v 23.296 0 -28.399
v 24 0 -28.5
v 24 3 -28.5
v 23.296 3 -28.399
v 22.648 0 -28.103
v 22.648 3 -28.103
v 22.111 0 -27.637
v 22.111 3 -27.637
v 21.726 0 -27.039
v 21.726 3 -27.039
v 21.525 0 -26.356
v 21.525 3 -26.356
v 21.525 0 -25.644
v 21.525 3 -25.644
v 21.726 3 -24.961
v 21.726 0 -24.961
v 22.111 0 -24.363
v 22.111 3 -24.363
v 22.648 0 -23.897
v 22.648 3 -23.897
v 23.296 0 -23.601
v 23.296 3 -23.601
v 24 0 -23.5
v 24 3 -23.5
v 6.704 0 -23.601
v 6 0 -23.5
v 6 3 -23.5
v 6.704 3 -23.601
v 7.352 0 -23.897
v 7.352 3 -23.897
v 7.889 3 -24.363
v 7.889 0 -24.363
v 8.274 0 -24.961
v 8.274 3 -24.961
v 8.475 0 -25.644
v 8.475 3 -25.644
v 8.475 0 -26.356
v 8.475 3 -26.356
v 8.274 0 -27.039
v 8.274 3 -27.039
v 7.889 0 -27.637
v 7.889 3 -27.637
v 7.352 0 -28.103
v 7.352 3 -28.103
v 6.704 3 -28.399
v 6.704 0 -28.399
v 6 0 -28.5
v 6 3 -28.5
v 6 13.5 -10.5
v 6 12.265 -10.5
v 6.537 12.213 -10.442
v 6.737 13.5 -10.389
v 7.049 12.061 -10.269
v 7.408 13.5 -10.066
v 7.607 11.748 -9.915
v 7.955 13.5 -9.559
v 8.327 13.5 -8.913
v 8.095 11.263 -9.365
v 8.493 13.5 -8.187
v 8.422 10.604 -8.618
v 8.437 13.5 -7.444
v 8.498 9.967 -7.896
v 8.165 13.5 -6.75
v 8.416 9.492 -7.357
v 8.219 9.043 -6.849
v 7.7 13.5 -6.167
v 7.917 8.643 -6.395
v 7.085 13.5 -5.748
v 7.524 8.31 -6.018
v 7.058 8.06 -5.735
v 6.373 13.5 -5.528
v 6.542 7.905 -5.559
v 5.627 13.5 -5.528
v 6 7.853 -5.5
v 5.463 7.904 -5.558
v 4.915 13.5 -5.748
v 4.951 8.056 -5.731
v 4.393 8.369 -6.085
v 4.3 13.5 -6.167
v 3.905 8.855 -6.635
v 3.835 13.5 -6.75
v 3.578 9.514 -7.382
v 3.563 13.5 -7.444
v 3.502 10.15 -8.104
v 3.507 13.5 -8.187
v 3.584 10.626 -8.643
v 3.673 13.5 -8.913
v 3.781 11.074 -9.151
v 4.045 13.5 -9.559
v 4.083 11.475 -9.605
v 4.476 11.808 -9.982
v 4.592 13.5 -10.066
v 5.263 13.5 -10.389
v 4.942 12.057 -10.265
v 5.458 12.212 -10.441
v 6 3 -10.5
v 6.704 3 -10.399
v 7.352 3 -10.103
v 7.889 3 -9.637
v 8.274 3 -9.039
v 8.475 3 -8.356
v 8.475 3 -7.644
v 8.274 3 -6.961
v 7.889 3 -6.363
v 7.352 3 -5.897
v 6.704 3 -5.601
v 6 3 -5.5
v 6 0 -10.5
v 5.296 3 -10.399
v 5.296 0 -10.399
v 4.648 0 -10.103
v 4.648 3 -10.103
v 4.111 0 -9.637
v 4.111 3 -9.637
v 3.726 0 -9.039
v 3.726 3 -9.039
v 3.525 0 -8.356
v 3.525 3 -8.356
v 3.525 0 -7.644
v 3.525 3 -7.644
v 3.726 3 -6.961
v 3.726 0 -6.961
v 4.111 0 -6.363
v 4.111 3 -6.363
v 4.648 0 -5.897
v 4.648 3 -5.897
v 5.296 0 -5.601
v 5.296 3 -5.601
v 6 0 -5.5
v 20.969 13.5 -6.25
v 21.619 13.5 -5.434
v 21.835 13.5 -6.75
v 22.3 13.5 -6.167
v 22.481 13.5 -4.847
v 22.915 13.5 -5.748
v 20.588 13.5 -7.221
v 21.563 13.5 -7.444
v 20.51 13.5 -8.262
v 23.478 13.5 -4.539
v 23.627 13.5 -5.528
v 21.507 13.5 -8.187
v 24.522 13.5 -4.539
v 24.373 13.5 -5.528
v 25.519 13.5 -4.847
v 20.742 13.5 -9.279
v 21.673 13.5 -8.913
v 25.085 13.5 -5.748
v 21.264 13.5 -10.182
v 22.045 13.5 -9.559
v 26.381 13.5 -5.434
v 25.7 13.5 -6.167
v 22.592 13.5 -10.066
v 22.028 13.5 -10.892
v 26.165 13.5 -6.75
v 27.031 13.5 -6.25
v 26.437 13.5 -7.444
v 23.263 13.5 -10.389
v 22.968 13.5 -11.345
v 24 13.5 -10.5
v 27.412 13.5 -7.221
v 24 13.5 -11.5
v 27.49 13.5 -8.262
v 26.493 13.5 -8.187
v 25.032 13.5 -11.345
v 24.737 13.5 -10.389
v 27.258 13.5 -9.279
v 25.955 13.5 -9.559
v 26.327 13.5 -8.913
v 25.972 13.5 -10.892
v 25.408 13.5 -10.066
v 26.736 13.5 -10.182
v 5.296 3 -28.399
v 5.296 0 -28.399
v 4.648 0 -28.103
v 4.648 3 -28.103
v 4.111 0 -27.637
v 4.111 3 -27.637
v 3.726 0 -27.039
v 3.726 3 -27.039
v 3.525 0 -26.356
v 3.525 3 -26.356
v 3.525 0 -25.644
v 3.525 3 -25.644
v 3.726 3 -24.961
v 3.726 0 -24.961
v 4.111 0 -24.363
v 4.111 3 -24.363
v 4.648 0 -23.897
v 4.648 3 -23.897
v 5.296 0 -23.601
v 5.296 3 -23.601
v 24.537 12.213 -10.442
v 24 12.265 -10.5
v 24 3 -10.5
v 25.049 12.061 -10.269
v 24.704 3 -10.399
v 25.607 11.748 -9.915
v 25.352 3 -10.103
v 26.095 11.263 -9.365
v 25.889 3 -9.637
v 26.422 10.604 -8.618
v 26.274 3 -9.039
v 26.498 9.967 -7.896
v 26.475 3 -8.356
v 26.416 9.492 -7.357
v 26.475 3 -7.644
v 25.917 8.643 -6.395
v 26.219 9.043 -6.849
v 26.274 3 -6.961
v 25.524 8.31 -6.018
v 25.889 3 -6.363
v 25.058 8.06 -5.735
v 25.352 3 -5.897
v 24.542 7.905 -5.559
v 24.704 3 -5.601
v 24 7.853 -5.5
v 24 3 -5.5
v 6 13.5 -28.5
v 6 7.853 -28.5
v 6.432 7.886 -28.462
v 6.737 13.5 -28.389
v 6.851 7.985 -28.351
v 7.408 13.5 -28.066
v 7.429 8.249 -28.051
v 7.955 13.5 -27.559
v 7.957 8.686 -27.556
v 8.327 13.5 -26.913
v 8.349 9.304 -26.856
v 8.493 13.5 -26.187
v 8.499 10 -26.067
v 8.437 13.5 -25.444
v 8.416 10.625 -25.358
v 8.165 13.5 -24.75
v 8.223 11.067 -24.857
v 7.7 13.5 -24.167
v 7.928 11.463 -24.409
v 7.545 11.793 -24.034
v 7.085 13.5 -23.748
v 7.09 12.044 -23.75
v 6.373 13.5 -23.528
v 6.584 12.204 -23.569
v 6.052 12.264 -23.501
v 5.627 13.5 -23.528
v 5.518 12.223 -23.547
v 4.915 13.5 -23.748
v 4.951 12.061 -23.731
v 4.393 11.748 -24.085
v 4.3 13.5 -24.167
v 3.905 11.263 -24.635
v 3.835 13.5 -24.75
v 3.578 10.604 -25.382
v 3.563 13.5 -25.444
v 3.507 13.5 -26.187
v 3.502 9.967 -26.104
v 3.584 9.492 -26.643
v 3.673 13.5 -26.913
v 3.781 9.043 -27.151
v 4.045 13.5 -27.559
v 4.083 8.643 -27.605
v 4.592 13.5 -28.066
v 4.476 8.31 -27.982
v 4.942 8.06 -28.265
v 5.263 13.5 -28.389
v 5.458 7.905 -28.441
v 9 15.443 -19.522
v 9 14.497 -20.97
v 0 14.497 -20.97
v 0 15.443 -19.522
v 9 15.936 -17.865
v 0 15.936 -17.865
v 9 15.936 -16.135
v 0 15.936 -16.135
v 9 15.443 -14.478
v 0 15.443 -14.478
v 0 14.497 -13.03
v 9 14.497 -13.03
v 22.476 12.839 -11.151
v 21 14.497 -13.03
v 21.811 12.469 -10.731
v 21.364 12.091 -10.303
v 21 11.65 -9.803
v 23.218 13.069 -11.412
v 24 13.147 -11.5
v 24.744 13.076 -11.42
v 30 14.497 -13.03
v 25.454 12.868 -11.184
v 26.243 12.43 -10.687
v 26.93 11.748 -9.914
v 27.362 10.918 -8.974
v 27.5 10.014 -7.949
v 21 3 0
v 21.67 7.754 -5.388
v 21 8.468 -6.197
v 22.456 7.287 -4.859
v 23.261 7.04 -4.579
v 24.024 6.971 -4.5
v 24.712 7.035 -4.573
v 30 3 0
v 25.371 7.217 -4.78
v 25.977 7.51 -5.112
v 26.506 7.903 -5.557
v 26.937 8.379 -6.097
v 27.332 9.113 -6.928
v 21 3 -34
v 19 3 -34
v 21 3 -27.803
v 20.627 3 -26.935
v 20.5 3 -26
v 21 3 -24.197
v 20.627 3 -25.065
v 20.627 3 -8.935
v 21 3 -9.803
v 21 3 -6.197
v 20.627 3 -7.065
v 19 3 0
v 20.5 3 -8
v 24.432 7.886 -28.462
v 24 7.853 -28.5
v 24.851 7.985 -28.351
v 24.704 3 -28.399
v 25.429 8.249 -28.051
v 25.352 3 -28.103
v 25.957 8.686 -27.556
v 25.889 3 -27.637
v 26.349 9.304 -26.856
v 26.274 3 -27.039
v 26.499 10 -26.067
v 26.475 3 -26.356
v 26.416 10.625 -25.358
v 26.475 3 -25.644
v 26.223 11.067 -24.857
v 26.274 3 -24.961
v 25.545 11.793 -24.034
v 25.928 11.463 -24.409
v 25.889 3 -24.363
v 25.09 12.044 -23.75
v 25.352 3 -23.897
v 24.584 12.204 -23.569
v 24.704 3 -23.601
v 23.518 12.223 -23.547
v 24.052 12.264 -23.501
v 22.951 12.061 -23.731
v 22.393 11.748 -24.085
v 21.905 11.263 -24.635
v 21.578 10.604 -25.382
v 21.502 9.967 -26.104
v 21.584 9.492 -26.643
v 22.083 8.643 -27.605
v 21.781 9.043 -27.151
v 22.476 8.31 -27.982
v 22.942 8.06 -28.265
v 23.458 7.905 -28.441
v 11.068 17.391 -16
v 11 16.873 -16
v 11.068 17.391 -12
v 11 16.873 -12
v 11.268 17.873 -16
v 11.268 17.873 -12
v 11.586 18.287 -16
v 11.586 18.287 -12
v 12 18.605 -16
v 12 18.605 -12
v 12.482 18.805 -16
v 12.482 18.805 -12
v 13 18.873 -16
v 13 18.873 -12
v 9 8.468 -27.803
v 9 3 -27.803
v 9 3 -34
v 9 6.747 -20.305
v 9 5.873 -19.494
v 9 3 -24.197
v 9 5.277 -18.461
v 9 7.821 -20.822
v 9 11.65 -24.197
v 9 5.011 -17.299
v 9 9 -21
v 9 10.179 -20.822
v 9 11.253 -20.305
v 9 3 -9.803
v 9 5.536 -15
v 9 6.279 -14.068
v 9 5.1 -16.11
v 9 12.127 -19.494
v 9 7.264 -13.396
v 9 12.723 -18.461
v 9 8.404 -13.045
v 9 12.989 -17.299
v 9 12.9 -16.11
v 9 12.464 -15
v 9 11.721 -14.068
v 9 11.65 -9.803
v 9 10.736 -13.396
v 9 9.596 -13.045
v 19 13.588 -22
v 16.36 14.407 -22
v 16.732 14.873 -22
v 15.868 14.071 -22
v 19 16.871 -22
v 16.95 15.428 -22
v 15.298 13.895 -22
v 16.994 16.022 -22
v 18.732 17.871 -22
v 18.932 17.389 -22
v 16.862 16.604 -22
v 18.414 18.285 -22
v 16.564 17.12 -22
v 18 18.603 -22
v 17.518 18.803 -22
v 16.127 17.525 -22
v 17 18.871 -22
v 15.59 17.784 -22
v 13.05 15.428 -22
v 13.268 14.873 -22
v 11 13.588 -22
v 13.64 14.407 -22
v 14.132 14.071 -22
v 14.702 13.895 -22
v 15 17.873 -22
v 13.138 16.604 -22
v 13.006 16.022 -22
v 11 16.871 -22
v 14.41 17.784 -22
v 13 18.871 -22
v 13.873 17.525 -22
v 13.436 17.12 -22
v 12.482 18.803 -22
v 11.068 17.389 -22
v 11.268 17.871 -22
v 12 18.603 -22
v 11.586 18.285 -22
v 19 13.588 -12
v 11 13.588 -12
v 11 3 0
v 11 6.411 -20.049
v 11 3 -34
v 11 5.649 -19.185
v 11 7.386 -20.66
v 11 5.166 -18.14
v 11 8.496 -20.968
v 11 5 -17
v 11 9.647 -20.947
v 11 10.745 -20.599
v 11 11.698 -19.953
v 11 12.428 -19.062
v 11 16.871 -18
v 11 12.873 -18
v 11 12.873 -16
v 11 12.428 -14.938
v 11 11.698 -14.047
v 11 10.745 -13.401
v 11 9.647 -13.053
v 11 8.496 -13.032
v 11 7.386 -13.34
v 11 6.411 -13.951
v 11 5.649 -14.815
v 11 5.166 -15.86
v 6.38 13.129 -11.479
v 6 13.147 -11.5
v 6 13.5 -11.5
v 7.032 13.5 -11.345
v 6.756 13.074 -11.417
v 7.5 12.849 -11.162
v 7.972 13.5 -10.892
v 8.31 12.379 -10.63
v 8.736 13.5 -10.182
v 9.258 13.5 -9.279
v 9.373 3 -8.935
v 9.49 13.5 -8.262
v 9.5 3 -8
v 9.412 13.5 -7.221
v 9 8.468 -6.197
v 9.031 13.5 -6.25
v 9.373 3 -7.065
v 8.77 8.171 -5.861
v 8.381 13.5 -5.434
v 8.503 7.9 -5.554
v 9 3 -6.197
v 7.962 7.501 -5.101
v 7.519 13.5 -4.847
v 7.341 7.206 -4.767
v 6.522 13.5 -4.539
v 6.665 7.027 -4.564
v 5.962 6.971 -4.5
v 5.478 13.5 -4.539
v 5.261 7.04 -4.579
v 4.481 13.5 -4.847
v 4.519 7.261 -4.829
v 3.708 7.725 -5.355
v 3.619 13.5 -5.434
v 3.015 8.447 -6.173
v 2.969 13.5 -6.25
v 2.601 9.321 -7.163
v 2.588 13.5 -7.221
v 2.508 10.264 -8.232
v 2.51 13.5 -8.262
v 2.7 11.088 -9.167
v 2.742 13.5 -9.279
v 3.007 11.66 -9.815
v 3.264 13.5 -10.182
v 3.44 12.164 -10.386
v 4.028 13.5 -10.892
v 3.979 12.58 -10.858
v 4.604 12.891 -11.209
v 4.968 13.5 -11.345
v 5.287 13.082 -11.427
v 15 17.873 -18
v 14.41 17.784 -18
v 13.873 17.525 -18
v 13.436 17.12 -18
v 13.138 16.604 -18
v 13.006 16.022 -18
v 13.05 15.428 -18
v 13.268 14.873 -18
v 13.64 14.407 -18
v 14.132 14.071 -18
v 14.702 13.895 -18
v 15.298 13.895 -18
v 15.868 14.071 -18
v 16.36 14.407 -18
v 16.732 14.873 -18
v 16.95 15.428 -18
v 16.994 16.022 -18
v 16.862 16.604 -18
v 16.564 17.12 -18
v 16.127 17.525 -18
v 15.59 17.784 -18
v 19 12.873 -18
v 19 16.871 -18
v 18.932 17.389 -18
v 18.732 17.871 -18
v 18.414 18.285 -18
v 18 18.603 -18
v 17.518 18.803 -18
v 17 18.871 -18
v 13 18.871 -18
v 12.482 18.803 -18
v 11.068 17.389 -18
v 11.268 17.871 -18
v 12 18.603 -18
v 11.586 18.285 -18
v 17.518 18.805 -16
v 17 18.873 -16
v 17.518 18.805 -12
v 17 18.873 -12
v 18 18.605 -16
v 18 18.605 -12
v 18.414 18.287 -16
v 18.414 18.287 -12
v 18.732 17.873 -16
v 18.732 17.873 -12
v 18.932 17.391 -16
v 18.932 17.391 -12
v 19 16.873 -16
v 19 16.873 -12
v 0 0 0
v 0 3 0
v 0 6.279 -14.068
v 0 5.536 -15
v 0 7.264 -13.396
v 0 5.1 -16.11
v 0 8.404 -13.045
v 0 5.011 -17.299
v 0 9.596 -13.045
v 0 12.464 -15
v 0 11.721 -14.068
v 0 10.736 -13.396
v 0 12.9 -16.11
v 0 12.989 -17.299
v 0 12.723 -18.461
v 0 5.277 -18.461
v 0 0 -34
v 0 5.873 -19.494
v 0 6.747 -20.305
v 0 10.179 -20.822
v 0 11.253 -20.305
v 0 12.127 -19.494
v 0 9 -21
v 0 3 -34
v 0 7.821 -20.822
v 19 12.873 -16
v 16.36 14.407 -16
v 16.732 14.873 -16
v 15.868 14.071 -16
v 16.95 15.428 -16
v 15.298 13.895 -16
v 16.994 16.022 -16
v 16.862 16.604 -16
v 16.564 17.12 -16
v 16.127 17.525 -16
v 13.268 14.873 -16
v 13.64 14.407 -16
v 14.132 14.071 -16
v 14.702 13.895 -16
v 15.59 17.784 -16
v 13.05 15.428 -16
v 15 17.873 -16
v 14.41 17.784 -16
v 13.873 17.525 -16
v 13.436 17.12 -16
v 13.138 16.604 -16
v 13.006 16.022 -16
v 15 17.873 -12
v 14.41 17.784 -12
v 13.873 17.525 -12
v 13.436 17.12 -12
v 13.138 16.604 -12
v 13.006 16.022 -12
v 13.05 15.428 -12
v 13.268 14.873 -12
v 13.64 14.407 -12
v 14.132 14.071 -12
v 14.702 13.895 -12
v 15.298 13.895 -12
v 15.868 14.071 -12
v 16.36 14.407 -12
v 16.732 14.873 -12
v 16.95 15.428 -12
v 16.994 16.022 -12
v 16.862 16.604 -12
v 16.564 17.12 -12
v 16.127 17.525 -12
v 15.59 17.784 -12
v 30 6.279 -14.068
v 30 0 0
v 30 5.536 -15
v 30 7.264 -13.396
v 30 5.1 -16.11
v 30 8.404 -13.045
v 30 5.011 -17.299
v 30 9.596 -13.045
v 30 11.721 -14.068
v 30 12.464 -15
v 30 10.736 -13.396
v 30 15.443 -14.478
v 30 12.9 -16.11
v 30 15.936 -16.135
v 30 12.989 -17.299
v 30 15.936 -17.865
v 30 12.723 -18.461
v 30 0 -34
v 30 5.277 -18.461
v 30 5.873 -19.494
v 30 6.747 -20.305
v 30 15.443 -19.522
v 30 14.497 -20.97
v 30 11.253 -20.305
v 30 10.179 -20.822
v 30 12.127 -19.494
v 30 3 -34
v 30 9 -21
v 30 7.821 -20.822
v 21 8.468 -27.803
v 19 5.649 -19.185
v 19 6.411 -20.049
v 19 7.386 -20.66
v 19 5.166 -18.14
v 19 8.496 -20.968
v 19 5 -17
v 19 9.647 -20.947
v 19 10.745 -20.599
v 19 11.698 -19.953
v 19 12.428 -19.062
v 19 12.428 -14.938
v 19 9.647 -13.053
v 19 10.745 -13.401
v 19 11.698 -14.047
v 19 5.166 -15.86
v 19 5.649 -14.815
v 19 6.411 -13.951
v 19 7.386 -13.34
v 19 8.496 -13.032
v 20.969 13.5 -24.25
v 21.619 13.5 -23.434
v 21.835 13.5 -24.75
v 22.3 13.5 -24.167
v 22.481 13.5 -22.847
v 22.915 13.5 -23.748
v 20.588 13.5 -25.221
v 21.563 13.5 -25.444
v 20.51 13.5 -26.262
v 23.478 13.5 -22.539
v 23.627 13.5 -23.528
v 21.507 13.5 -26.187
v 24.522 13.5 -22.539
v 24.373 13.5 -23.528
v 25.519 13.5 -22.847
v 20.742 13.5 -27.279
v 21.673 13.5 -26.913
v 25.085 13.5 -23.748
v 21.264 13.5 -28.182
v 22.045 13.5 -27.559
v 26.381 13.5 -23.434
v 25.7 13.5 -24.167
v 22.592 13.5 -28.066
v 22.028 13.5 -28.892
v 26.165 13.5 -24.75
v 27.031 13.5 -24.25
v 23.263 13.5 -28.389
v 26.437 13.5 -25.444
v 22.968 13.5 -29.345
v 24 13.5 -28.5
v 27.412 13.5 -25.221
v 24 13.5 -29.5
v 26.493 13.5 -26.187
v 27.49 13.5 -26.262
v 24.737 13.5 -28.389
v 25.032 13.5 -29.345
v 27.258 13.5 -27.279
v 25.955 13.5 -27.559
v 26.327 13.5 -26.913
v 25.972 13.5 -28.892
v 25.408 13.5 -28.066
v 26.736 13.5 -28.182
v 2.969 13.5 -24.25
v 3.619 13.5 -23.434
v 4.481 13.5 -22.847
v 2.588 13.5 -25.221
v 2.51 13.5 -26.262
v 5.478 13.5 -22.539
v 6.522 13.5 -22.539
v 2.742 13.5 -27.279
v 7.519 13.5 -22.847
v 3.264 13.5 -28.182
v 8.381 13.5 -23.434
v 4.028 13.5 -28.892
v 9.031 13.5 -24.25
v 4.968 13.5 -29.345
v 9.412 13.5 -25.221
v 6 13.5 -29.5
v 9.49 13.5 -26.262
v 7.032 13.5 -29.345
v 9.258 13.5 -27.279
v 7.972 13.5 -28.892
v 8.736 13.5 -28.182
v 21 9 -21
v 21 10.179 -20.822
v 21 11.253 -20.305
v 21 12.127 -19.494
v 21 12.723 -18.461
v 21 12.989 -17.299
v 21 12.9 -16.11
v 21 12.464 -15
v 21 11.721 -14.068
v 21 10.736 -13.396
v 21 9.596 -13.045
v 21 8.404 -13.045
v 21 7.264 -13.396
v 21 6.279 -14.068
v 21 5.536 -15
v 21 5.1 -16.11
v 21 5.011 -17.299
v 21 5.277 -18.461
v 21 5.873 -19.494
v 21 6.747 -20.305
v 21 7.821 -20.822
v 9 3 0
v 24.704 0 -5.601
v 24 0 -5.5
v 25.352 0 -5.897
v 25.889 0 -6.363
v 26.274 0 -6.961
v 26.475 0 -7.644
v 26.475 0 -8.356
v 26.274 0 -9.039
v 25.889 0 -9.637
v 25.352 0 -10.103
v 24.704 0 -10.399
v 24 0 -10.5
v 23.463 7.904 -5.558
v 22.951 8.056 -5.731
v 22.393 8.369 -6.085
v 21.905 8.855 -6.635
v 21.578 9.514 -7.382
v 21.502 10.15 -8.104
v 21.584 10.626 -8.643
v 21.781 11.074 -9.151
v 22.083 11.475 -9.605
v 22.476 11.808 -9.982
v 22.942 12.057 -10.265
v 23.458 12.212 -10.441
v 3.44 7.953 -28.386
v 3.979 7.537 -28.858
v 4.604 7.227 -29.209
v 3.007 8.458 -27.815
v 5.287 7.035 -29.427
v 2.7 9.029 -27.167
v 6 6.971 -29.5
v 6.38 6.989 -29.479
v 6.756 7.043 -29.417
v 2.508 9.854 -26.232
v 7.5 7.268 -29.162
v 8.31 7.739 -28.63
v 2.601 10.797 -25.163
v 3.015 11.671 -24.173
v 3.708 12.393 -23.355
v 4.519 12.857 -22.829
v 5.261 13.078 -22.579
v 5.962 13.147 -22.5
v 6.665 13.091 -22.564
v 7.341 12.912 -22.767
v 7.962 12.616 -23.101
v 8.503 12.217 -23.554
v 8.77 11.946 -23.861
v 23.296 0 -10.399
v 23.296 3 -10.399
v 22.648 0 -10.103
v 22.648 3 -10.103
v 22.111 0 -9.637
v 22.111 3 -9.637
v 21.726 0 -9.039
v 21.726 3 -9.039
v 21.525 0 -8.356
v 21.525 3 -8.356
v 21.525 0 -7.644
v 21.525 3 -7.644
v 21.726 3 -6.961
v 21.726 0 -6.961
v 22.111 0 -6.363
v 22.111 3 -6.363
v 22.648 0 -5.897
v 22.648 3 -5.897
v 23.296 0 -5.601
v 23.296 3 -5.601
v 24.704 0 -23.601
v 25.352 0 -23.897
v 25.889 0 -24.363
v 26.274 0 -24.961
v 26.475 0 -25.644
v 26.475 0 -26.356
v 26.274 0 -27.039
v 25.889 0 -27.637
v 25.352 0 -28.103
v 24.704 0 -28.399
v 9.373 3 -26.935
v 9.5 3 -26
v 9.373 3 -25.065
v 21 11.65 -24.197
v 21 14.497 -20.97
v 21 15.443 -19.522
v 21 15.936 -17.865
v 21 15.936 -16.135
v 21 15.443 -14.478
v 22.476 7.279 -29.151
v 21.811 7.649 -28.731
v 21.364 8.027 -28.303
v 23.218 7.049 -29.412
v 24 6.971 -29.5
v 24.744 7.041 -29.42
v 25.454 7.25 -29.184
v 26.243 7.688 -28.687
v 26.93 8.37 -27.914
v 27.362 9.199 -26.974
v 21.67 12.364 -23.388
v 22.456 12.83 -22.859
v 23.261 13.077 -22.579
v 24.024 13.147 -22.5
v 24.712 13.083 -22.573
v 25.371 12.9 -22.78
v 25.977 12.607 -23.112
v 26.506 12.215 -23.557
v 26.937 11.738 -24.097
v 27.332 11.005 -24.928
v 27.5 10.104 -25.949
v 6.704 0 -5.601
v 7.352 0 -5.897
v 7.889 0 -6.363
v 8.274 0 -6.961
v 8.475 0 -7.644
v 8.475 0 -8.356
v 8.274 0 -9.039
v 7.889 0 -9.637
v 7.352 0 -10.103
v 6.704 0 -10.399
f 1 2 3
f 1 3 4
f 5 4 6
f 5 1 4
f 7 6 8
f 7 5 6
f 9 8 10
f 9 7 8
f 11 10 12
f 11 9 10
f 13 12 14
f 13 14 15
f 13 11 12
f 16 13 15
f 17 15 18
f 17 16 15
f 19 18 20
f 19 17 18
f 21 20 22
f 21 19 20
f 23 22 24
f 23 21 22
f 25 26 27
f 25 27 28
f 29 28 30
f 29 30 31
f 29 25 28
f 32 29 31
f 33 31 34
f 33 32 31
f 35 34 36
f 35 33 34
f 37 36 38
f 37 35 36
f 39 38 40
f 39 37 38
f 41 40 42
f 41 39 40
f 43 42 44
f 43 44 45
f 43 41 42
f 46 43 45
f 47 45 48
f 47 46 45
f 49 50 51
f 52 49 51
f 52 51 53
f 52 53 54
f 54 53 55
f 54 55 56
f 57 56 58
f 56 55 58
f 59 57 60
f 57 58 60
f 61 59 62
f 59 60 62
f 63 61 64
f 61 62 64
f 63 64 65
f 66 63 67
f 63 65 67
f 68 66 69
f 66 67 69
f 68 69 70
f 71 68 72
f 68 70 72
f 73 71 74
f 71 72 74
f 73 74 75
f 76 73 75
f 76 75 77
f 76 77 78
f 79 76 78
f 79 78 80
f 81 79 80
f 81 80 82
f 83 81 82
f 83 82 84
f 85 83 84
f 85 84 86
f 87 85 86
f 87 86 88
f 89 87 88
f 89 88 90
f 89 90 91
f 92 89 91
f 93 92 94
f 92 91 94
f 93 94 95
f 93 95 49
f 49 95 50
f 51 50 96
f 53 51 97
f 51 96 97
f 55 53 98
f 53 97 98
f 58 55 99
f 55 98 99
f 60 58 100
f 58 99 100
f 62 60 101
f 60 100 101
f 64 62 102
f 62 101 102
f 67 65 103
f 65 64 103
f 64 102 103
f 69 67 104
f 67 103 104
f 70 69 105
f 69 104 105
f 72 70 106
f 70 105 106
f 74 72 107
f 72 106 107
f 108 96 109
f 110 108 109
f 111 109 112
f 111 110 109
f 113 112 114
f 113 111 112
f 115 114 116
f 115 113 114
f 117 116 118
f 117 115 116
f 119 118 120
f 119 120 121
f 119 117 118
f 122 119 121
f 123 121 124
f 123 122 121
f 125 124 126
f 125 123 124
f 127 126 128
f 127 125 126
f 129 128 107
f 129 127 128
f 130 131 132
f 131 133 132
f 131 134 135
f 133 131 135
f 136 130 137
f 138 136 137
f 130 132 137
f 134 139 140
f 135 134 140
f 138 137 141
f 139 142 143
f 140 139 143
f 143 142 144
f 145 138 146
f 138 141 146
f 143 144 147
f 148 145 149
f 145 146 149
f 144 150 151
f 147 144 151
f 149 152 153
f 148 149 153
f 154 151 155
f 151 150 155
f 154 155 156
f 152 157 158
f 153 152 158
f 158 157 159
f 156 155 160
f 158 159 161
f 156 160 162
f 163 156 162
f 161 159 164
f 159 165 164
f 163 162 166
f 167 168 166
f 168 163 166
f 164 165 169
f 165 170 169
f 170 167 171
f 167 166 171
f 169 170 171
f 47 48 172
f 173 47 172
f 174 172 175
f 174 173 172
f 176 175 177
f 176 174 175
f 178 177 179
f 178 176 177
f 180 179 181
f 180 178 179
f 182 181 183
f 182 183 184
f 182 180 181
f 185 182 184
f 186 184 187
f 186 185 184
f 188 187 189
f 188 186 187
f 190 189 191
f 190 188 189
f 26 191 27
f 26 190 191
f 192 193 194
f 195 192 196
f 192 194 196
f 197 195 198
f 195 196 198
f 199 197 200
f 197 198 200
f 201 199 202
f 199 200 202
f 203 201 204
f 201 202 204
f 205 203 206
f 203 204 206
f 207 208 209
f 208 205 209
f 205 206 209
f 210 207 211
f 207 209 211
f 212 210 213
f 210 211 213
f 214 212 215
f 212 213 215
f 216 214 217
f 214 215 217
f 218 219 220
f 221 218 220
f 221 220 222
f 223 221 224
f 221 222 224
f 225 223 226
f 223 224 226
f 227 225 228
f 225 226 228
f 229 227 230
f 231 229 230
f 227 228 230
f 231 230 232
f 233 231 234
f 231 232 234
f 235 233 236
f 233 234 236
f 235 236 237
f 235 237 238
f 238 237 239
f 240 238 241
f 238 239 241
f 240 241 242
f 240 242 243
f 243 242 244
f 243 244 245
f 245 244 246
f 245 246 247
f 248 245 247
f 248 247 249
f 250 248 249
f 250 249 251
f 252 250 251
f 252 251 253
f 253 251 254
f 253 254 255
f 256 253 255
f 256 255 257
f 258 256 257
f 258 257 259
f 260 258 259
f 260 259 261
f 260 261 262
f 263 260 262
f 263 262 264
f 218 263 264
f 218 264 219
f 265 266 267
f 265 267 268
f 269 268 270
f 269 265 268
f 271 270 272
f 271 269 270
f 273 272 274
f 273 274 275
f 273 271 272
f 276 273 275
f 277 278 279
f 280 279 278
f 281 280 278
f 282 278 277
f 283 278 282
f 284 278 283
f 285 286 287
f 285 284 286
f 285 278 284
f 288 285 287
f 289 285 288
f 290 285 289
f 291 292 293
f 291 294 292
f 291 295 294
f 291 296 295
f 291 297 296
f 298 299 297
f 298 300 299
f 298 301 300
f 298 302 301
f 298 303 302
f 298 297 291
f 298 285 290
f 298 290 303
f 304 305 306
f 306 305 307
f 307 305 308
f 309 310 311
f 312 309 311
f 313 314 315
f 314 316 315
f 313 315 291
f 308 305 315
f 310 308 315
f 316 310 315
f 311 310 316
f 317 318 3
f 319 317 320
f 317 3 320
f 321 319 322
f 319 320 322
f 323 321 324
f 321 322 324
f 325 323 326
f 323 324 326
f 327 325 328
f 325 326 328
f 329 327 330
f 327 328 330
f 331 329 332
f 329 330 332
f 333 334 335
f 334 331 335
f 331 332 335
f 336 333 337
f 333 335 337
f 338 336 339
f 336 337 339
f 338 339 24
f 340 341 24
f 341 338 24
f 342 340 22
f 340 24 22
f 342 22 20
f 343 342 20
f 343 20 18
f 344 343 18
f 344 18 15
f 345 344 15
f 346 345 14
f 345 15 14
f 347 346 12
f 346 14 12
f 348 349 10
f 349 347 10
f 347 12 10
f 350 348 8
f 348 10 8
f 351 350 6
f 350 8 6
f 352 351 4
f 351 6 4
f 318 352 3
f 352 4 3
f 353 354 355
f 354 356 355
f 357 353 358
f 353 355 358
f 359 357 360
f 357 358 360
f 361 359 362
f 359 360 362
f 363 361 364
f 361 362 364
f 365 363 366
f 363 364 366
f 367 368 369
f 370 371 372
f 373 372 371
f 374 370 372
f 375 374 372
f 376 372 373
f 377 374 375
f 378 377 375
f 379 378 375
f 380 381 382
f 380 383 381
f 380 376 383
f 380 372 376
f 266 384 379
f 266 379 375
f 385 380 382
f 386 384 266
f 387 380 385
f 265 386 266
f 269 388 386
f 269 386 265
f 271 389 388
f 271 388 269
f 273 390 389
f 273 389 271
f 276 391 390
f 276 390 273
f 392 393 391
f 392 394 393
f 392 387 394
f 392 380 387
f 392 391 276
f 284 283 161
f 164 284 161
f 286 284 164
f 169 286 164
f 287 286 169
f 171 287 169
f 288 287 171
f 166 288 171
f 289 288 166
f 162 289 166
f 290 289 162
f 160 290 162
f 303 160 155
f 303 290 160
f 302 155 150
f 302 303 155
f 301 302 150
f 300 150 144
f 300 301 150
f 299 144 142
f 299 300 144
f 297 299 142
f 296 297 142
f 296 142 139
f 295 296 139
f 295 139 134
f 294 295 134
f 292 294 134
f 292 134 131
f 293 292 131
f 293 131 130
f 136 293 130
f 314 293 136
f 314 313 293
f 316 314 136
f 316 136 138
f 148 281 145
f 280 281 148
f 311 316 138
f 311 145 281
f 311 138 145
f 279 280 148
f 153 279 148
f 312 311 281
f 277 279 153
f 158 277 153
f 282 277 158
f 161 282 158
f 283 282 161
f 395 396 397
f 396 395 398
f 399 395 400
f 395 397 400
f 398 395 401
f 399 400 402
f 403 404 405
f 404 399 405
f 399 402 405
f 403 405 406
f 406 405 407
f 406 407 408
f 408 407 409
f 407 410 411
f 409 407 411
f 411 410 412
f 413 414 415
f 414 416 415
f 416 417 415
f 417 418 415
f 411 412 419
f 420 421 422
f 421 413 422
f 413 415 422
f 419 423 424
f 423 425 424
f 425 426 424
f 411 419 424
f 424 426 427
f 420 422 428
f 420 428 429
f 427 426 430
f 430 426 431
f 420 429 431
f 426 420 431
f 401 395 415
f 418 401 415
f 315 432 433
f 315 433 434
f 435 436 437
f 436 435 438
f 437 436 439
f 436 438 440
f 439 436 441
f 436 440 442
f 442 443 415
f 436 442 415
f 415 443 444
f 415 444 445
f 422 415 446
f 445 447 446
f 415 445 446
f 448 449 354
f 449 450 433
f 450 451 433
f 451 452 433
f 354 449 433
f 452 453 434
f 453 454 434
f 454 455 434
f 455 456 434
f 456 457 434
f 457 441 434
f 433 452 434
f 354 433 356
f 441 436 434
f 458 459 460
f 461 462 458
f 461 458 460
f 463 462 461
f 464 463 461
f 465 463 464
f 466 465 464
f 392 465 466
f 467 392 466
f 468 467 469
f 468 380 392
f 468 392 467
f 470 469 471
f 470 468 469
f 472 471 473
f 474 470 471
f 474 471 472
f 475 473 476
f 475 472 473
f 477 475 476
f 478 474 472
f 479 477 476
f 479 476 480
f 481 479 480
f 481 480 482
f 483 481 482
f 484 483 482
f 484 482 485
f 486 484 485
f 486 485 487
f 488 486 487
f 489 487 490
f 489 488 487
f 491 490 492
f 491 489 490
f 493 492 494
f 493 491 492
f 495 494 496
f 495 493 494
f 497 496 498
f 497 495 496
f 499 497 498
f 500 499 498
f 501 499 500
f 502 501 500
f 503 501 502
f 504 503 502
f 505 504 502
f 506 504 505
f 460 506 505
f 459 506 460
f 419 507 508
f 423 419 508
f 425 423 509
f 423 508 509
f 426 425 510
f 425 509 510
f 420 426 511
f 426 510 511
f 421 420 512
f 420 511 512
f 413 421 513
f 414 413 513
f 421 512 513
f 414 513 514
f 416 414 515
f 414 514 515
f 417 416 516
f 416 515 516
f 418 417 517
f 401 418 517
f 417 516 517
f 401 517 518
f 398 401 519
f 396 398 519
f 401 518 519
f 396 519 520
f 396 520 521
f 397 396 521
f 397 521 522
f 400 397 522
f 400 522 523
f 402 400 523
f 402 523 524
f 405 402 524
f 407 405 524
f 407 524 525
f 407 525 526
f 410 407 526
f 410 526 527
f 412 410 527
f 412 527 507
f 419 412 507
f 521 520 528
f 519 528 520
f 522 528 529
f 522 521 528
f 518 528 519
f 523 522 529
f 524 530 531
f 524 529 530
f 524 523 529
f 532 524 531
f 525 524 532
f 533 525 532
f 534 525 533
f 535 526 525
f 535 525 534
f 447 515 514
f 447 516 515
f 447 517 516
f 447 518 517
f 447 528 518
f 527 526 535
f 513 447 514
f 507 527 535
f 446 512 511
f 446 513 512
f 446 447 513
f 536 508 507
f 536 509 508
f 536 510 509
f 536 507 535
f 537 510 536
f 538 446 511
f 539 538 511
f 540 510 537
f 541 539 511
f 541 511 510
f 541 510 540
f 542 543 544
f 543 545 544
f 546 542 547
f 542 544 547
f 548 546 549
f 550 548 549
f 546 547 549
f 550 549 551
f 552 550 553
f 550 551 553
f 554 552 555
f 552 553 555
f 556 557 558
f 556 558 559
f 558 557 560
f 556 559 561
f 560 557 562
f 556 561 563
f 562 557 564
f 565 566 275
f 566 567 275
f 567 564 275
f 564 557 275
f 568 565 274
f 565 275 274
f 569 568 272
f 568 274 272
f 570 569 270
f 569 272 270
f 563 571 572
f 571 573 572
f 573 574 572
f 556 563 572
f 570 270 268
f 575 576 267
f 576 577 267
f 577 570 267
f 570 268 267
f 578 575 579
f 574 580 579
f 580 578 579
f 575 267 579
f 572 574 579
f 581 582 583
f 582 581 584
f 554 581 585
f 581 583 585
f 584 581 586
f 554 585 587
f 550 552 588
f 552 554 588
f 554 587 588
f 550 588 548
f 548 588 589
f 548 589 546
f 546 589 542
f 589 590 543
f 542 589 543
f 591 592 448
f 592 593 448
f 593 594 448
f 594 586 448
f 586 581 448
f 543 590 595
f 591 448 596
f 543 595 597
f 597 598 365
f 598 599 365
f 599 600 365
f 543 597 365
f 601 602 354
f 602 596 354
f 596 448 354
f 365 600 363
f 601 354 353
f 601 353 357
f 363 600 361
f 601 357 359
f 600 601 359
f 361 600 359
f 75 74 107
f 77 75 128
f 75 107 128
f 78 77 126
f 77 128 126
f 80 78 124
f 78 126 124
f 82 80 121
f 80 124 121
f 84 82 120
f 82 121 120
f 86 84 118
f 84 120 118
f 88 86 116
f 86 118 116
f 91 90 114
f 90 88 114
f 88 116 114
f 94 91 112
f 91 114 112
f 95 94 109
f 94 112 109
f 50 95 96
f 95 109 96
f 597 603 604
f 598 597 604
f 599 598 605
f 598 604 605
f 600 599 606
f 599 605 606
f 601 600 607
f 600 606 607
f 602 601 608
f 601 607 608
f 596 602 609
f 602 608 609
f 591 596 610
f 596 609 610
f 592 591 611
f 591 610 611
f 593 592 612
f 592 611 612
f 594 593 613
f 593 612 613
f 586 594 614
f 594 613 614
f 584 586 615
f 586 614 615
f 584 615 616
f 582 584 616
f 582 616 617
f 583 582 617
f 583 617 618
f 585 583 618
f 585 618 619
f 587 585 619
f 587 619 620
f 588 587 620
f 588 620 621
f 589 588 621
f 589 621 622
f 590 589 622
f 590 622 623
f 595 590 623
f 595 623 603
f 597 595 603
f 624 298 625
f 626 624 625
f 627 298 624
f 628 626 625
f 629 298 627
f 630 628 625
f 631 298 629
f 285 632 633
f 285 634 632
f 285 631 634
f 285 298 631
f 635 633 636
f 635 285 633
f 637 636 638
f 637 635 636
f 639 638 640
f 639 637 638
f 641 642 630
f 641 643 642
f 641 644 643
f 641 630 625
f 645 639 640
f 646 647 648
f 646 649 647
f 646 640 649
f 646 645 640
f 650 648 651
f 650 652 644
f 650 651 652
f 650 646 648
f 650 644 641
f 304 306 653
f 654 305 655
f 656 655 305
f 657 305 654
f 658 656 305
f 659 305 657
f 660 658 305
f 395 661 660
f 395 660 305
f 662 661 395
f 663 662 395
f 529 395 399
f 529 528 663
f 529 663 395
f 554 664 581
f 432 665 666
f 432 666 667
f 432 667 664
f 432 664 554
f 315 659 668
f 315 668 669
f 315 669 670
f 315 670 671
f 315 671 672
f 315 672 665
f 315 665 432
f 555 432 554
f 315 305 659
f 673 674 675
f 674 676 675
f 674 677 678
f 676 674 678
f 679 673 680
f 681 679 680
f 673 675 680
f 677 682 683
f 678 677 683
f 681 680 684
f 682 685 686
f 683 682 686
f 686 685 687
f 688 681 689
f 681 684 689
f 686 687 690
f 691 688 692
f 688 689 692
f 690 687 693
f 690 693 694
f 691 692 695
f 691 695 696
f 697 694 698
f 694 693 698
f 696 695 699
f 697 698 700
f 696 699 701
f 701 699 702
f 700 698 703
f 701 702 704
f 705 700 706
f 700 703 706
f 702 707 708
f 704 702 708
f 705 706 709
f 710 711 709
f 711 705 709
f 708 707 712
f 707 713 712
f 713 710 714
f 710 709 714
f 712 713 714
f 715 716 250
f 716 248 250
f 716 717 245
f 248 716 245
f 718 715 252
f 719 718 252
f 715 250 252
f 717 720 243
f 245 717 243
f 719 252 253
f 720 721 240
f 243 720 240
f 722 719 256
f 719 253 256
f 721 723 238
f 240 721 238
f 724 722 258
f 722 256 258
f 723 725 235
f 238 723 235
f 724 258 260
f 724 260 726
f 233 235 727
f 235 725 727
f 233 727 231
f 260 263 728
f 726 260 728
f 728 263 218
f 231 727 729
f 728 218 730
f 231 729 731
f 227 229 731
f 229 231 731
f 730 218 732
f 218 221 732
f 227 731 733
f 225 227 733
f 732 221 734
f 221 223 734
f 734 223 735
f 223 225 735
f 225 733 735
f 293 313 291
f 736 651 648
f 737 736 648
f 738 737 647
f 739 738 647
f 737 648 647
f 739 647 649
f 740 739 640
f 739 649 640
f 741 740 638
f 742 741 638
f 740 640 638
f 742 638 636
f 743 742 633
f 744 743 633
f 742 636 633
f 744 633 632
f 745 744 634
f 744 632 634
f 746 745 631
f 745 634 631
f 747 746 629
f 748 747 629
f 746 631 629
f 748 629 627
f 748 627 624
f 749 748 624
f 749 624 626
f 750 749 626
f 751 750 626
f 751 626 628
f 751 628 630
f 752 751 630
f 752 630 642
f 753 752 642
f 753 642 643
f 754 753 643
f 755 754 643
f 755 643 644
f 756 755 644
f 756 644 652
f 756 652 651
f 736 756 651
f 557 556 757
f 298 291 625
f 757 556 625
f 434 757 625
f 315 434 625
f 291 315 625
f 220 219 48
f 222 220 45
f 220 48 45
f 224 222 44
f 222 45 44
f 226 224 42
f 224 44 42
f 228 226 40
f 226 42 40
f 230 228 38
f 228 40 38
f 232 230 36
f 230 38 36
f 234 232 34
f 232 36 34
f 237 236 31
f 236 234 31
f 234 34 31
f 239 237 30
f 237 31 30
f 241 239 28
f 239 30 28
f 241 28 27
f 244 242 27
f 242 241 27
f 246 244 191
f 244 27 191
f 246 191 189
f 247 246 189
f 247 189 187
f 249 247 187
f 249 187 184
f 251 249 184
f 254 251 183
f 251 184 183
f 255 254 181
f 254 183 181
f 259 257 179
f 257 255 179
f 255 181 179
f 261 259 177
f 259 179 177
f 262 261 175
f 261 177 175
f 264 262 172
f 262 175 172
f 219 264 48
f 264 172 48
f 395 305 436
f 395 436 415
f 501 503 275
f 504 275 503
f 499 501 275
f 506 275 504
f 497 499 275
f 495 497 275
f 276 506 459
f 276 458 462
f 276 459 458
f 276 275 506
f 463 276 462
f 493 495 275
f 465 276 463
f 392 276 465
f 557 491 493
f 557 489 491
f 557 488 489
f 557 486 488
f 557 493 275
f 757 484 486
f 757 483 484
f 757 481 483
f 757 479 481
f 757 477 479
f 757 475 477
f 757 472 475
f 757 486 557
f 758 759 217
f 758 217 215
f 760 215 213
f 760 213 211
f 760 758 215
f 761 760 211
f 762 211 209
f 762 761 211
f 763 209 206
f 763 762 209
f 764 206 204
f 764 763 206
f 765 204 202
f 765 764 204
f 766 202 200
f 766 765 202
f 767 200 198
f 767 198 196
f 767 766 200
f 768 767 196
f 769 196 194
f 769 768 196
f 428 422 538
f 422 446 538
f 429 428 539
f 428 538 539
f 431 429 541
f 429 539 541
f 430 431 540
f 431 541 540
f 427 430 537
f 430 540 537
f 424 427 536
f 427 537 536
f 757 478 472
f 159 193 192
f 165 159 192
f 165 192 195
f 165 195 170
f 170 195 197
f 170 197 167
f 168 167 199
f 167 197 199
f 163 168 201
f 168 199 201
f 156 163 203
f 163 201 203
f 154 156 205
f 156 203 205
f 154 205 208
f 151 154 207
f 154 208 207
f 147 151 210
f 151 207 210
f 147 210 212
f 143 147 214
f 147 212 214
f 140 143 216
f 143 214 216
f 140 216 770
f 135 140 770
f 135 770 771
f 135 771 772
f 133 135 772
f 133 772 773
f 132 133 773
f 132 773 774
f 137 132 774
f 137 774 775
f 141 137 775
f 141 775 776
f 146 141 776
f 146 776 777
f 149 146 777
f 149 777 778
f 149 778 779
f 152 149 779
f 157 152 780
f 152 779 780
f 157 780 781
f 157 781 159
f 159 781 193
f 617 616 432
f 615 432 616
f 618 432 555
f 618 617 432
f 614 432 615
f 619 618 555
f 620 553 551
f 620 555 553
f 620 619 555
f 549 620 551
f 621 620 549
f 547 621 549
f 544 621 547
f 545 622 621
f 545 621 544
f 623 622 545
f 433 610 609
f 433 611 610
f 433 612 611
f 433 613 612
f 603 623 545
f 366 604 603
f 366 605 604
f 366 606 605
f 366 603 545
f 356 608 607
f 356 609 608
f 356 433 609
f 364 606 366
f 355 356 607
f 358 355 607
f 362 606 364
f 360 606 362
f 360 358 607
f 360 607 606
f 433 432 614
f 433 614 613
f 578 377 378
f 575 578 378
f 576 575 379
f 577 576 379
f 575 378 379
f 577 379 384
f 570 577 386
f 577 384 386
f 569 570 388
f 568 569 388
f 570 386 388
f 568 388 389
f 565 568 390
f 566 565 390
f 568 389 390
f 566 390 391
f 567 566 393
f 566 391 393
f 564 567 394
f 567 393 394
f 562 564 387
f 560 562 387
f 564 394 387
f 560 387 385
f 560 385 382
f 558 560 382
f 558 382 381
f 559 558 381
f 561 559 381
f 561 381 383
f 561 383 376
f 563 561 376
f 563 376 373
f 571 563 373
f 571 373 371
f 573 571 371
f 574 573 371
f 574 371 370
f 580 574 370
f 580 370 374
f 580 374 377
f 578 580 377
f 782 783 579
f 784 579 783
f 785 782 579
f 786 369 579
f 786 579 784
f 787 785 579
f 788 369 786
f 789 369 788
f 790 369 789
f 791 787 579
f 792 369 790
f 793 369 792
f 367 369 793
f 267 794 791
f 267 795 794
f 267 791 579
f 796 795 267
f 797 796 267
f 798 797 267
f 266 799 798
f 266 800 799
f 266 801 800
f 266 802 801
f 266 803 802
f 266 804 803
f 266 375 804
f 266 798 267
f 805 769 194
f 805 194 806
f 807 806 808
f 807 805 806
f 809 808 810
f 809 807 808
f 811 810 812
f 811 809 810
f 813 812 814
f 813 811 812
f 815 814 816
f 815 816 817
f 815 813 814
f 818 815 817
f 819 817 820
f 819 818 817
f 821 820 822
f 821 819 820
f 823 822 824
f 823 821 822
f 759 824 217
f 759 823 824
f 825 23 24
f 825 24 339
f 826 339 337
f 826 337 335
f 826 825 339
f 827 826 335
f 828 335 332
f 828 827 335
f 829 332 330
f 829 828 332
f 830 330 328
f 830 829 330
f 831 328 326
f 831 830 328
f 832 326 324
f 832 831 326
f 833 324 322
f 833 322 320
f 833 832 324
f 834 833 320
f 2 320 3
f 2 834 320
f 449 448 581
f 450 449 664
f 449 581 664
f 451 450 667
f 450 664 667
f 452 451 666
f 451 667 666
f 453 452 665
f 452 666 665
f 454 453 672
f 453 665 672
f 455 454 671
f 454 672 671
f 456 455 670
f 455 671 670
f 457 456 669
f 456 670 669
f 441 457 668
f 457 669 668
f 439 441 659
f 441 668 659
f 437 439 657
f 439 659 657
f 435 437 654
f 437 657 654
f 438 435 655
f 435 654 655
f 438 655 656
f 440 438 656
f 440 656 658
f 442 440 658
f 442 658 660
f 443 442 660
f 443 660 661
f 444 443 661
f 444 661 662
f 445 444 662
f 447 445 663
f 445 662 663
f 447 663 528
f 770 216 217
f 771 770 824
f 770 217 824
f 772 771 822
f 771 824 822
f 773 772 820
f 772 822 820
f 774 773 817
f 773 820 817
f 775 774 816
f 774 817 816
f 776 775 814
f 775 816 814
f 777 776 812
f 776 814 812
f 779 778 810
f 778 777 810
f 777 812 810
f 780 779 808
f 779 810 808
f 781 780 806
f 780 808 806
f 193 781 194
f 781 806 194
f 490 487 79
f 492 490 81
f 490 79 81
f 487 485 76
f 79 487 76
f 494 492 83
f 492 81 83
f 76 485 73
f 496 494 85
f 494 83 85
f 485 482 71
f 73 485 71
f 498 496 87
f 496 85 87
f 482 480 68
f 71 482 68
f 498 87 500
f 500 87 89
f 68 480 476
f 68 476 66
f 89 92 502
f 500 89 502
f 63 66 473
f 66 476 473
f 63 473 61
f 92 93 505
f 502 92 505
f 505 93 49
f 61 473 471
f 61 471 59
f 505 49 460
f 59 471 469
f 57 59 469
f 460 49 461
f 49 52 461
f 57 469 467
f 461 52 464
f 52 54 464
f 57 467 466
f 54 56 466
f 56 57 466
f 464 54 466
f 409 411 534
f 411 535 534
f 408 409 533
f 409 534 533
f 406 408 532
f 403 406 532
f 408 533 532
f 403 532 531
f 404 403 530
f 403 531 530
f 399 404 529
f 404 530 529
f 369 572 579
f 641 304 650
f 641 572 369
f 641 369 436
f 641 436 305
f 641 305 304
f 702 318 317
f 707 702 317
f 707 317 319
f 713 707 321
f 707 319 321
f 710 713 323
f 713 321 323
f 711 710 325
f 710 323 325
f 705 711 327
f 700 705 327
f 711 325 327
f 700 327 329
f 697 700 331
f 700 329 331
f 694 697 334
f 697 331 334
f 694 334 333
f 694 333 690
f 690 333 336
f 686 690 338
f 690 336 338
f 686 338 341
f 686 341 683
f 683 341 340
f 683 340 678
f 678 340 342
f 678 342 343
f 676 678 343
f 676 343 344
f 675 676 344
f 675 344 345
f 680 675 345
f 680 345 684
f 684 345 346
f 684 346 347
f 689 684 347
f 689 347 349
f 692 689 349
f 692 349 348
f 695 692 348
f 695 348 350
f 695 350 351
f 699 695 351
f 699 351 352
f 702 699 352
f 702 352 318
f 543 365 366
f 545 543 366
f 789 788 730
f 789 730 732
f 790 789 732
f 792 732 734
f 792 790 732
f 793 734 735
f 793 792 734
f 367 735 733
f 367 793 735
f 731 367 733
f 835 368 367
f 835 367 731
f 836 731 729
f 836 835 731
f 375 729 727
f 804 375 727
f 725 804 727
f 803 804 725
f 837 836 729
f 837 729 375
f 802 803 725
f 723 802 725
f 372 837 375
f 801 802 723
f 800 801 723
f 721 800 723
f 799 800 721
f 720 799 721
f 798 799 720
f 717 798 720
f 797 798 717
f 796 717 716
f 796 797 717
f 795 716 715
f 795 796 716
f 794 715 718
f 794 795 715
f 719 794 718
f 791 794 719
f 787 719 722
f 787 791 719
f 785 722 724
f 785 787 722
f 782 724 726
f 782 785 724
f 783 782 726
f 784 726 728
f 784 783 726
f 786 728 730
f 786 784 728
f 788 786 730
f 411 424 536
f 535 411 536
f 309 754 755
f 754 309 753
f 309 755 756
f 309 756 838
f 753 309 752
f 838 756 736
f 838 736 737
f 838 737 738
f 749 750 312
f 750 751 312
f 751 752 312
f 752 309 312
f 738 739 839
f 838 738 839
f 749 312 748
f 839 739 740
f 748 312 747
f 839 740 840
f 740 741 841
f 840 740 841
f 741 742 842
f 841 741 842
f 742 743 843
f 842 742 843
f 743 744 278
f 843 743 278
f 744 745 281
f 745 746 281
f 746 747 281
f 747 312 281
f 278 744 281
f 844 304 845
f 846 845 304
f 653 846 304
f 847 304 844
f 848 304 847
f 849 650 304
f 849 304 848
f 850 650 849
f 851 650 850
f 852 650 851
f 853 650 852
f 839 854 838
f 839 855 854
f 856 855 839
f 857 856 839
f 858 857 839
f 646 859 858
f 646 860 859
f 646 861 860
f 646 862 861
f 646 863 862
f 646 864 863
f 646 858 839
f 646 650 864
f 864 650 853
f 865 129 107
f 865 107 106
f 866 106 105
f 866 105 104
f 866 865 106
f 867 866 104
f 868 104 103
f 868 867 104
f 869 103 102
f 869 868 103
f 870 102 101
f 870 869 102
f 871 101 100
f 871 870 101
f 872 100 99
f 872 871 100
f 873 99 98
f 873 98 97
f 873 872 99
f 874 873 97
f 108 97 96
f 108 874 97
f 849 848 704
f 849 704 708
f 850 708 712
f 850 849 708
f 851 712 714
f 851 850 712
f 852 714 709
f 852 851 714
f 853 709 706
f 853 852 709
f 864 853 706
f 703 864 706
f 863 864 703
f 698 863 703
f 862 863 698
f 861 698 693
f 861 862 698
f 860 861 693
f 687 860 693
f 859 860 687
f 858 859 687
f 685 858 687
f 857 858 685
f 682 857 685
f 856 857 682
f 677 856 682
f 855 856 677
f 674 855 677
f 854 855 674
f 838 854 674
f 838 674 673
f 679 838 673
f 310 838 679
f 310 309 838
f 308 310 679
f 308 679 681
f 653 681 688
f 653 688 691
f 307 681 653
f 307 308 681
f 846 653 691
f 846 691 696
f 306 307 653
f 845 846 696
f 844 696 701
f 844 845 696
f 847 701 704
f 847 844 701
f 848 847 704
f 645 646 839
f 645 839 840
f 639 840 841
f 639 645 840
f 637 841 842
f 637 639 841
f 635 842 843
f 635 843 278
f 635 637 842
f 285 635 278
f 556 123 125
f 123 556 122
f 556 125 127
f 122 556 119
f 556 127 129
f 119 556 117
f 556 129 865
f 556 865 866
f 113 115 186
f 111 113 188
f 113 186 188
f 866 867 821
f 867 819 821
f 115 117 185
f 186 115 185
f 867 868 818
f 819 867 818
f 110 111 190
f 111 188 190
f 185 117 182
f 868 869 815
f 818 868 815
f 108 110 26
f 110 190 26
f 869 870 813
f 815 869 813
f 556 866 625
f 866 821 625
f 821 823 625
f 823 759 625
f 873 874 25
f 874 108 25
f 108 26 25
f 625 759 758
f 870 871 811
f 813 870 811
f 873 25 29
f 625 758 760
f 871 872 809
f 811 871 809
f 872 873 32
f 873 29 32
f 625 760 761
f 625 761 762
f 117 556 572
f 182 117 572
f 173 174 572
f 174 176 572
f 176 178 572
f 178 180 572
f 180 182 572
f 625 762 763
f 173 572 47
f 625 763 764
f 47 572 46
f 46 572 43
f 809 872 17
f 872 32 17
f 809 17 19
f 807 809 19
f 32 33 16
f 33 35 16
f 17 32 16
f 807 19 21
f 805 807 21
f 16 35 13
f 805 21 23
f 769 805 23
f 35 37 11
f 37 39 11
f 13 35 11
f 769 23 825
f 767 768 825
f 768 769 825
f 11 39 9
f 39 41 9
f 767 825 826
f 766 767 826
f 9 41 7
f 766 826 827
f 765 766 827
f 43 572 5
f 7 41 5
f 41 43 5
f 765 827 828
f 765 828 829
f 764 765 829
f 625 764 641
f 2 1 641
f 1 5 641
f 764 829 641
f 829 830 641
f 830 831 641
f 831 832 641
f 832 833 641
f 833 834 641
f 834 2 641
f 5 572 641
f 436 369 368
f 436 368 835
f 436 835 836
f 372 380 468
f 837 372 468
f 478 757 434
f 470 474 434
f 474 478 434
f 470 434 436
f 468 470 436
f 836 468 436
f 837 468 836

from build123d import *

# Parameters (mm, degrees)
SKETCH1_W           = 30
SKETCH1_H           = 34
SKETCH1_R           = 2.5
BOSS_EXTRUDE1_DEPTH = 3
SKETCH2_R           = 4
BOSS_EXTRUDE2_DEPTH = 30
SKETCH3_R           = 2.5
CUT_EXTRUDE1_DEPTH  = 49.082685508
SKETCH4_W           = 2
SKETCH4_H           = 13.407026696
CUT_EXTRUDE2_DEPTH  = 49.082685508
CUT_EXTRUDE3_REACH  = 44.106
SKETCH5_W           = 2
SKETCH5_H           = 4.553085987
SKETCH6_W           = 4
SKETCH6_H           = 6
SKETCH6_H_2         = 5.998001256
BOSS_EXTRUDE3_DEPTH = 8
SKETCH7_R           = 2
CUT_EXTRUDE4_DEPTH  = 42.715578629
FILLET1_R           = 2
SKETCH8_R           = 3.5
SKETCH8_R_2         = 2.5
BOSS_EXTRUDE4_DEPTH = 13.5


with BuildPart() as part:
    # Sketch1 → Boss-Extrude1 (new body)
    with BuildSketch(Plane(origin=(0, 0, 0), x_dir=(1, 0, 0), z_dir=(0, 1, 0))):
        with Locations((15, 17)):
            Rectangle(SKETCH1_W, SKETCH1_H)
        with Locations(Location((6, 26, 0), (0, 0, 270))):
            Circle(SKETCH1_R, mode=Mode.SUBTRACT)
        with Locations(Location((24, 26, 0), (0, 0, 270))):
            Circle(SKETCH1_R, mode=Mode.SUBTRACT)
        with Locations(Location((6, 8, 0), (0, 0, 270))):
            Circle(SKETCH1_R, mode=Mode.SUBTRACT)
        with Locations(Location((24, 8, 0), (0, 0, 270))):
            Circle(SKETCH1_R, mode=Mode.SUBTRACT)
    extrude(amount=BOSS_EXTRUDE1_DEPTH)

    # Sketch2 → Boss-Extrude2 (add, through all)
    with BuildSketch(Plane(origin=(30, 0, 0), x_dir=(0, 0, -1), z_dir=(1, 0, 0))):
        with BuildLine():
            Line((34, 3), (20.969729823, 14.497297215))
            ThreePointArc((20.969729823, 14.497297215), (17, 15.998270083), (13.030270177, 14.497297215))
            Line((13.030270177, 14.497297215), (0, 3))
            Line((0, 3), (34, 3))
        make_face()
        with Locations((17, 9)):
            Circle(SKETCH2_R, mode=Mode.SUBTRACT)
    extrude(amount=-BOSS_EXTRUDE2_DEPTH)

    # Sketch3 → Cut-Extrude1 (cut, through all)
    with BuildSketch(Plane.XZ):
        with Locations(Location((6, -8, 0), (0, 0, 90))):
            Circle(SKETCH3_R)
        with Locations(Location((24, -8, 0), (0, 0, 90))):
            Circle(SKETCH3_R)
        with Locations(Location((24, -26, 0), (0, 0, 270))):
            Circle(SKETCH3_R)
        with Locations(Location((6, -26, 0), (0, 0, 270))):
            Circle(SKETCH3_R)
    extrude(amount=-CUT_EXTRUDE1_DEPTH, mode=Mode.SUBTRACT)

    # Sketch4 → Cut-Extrude2 (cut, through all)
    with BuildSketch(Plane.XY):
        with Locations((10, 9.703513348)):
            Rectangle(SKETCH4_W, SKETCH4_H)
        with Locations((20, 9.703513348)):
            Rectangle(SKETCH4_W, SKETCH4_H)
    extrude(amount=-CUT_EXTRUDE2_DEPTH, mode=Mode.SUBTRACT)

    # Sketch5 → Cut-Extrude3 (cut, up to next)
    with BuildSketch(Plane.ZY.offset(-11), mode=Mode.PRIVATE) as cut_extrude3_sk1:
        with Locations((-17, 14.233519348)):
            Rectangle(SKETCH5_W, SKETCH5_H)
    cut_extrude3_tool1 = extrude(cut_extrude3_sk1.sketch, amount=-CUT_EXTRUDE3_REACH, mode=Mode.PRIVATE) & part.part
    add(cut_extrude3_tool1.solids().sort_by_distance((11, 14.233519, -17))[0], mode=Mode.SUBTRACT)

    # Sketch6 → Boss-Extrude3 (add)
    with BuildSketch(Plane.ZY.offset(-11)):
        with Locations((-14, 15.872983346)):
            Rectangle(SKETCH6_W, SKETCH6_H)
        with Locations((-20, 15.871983974)):
            Rectangle(SKETCH6_W, SKETCH6_H_2)
    extrude(amount=-BOSS_EXTRUDE3_DEPTH)

    # Sketch7 → Cut-Extrude4 (cut, through all)
    with BuildSketch(Plane.XY.offset(-12)):
        with Locations(Location((15, 15.872983346, 0), (0, 0, 90))):
            Circle(SKETCH7_R)
    extrude(amount=-CUT_EXTRUDE4_DEPTH, mode=Mode.SUBTRACT)

    # Fillet1
    fillet1_edges = [part.edges().sort_by_distance(p)[0] for p in [
        (19, 18.872983346, -14),
        (11, 18.872983346, -14),
        (19, 18.870984602, -20),
        (11, 18.870984602, -20),
    ]]
    fillet(fillet1_edges, radius=FILLET1_R)

    # Sketch8 → Boss-Extrude4 (add)
    # profile 1 of 4: a face of its own
    with BuildSketch(Plane(origin=(0, 0, 0), x_dir=(-1, 0, 0), z_dir=(0, -1, 0))):
        with Locations(Location((-6, 8, 0), (0, 0, 90))):
            Circle(SKETCH8_R)
        with Locations(Location((-6, 8, 0), (0, 0, 90))):
            Circle(SKETCH8_R_2, mode=Mode.SUBTRACT)
    # profile 2 of 4: a face of its own
    with BuildSketch(Plane(origin=(0, 0, 0), x_dir=(-1, 0, 0), z_dir=(0, -1, 0))):
        with Locations(Location((-24, 8, 0), (0, 0, 90))):
            Circle(SKETCH8_R)
        with Locations(Location((-24, 8, 0), (0, 0, 90))):
            Circle(SKETCH8_R_2, mode=Mode.SUBTRACT)
    # profile 3 of 4: a face of its own
    with BuildSketch(Plane(origin=(0, 0, 0), x_dir=(-1, 0, 0), z_dir=(0, -1, 0))):
        with Locations(Location((-6, 26, 0), (0, 0, 90))):
            Circle(SKETCH8_R)
        with Locations(Location((-6, 26, 0), (0, 0, 90))):
            Circle(SKETCH8_R_2, mode=Mode.SUBTRACT)
    # profile 4 of 4: a face of its own
    with BuildSketch(Plane(origin=(0, 0, 0), x_dir=(-1, 0, 0), z_dir=(0, -1, 0))):
        with Locations(Location((-24, 26, 0), (0, 0, 90))):
            Circle(SKETCH8_R)
        with Locations(Location((-24, 26, 0), (0, 0, 90))):
            Circle(SKETCH8_R_2, mode=Mode.SUBTRACT)
    extrude(amount=-BOSS_EXTRUDE4_DEPTH)


solid = part.part
